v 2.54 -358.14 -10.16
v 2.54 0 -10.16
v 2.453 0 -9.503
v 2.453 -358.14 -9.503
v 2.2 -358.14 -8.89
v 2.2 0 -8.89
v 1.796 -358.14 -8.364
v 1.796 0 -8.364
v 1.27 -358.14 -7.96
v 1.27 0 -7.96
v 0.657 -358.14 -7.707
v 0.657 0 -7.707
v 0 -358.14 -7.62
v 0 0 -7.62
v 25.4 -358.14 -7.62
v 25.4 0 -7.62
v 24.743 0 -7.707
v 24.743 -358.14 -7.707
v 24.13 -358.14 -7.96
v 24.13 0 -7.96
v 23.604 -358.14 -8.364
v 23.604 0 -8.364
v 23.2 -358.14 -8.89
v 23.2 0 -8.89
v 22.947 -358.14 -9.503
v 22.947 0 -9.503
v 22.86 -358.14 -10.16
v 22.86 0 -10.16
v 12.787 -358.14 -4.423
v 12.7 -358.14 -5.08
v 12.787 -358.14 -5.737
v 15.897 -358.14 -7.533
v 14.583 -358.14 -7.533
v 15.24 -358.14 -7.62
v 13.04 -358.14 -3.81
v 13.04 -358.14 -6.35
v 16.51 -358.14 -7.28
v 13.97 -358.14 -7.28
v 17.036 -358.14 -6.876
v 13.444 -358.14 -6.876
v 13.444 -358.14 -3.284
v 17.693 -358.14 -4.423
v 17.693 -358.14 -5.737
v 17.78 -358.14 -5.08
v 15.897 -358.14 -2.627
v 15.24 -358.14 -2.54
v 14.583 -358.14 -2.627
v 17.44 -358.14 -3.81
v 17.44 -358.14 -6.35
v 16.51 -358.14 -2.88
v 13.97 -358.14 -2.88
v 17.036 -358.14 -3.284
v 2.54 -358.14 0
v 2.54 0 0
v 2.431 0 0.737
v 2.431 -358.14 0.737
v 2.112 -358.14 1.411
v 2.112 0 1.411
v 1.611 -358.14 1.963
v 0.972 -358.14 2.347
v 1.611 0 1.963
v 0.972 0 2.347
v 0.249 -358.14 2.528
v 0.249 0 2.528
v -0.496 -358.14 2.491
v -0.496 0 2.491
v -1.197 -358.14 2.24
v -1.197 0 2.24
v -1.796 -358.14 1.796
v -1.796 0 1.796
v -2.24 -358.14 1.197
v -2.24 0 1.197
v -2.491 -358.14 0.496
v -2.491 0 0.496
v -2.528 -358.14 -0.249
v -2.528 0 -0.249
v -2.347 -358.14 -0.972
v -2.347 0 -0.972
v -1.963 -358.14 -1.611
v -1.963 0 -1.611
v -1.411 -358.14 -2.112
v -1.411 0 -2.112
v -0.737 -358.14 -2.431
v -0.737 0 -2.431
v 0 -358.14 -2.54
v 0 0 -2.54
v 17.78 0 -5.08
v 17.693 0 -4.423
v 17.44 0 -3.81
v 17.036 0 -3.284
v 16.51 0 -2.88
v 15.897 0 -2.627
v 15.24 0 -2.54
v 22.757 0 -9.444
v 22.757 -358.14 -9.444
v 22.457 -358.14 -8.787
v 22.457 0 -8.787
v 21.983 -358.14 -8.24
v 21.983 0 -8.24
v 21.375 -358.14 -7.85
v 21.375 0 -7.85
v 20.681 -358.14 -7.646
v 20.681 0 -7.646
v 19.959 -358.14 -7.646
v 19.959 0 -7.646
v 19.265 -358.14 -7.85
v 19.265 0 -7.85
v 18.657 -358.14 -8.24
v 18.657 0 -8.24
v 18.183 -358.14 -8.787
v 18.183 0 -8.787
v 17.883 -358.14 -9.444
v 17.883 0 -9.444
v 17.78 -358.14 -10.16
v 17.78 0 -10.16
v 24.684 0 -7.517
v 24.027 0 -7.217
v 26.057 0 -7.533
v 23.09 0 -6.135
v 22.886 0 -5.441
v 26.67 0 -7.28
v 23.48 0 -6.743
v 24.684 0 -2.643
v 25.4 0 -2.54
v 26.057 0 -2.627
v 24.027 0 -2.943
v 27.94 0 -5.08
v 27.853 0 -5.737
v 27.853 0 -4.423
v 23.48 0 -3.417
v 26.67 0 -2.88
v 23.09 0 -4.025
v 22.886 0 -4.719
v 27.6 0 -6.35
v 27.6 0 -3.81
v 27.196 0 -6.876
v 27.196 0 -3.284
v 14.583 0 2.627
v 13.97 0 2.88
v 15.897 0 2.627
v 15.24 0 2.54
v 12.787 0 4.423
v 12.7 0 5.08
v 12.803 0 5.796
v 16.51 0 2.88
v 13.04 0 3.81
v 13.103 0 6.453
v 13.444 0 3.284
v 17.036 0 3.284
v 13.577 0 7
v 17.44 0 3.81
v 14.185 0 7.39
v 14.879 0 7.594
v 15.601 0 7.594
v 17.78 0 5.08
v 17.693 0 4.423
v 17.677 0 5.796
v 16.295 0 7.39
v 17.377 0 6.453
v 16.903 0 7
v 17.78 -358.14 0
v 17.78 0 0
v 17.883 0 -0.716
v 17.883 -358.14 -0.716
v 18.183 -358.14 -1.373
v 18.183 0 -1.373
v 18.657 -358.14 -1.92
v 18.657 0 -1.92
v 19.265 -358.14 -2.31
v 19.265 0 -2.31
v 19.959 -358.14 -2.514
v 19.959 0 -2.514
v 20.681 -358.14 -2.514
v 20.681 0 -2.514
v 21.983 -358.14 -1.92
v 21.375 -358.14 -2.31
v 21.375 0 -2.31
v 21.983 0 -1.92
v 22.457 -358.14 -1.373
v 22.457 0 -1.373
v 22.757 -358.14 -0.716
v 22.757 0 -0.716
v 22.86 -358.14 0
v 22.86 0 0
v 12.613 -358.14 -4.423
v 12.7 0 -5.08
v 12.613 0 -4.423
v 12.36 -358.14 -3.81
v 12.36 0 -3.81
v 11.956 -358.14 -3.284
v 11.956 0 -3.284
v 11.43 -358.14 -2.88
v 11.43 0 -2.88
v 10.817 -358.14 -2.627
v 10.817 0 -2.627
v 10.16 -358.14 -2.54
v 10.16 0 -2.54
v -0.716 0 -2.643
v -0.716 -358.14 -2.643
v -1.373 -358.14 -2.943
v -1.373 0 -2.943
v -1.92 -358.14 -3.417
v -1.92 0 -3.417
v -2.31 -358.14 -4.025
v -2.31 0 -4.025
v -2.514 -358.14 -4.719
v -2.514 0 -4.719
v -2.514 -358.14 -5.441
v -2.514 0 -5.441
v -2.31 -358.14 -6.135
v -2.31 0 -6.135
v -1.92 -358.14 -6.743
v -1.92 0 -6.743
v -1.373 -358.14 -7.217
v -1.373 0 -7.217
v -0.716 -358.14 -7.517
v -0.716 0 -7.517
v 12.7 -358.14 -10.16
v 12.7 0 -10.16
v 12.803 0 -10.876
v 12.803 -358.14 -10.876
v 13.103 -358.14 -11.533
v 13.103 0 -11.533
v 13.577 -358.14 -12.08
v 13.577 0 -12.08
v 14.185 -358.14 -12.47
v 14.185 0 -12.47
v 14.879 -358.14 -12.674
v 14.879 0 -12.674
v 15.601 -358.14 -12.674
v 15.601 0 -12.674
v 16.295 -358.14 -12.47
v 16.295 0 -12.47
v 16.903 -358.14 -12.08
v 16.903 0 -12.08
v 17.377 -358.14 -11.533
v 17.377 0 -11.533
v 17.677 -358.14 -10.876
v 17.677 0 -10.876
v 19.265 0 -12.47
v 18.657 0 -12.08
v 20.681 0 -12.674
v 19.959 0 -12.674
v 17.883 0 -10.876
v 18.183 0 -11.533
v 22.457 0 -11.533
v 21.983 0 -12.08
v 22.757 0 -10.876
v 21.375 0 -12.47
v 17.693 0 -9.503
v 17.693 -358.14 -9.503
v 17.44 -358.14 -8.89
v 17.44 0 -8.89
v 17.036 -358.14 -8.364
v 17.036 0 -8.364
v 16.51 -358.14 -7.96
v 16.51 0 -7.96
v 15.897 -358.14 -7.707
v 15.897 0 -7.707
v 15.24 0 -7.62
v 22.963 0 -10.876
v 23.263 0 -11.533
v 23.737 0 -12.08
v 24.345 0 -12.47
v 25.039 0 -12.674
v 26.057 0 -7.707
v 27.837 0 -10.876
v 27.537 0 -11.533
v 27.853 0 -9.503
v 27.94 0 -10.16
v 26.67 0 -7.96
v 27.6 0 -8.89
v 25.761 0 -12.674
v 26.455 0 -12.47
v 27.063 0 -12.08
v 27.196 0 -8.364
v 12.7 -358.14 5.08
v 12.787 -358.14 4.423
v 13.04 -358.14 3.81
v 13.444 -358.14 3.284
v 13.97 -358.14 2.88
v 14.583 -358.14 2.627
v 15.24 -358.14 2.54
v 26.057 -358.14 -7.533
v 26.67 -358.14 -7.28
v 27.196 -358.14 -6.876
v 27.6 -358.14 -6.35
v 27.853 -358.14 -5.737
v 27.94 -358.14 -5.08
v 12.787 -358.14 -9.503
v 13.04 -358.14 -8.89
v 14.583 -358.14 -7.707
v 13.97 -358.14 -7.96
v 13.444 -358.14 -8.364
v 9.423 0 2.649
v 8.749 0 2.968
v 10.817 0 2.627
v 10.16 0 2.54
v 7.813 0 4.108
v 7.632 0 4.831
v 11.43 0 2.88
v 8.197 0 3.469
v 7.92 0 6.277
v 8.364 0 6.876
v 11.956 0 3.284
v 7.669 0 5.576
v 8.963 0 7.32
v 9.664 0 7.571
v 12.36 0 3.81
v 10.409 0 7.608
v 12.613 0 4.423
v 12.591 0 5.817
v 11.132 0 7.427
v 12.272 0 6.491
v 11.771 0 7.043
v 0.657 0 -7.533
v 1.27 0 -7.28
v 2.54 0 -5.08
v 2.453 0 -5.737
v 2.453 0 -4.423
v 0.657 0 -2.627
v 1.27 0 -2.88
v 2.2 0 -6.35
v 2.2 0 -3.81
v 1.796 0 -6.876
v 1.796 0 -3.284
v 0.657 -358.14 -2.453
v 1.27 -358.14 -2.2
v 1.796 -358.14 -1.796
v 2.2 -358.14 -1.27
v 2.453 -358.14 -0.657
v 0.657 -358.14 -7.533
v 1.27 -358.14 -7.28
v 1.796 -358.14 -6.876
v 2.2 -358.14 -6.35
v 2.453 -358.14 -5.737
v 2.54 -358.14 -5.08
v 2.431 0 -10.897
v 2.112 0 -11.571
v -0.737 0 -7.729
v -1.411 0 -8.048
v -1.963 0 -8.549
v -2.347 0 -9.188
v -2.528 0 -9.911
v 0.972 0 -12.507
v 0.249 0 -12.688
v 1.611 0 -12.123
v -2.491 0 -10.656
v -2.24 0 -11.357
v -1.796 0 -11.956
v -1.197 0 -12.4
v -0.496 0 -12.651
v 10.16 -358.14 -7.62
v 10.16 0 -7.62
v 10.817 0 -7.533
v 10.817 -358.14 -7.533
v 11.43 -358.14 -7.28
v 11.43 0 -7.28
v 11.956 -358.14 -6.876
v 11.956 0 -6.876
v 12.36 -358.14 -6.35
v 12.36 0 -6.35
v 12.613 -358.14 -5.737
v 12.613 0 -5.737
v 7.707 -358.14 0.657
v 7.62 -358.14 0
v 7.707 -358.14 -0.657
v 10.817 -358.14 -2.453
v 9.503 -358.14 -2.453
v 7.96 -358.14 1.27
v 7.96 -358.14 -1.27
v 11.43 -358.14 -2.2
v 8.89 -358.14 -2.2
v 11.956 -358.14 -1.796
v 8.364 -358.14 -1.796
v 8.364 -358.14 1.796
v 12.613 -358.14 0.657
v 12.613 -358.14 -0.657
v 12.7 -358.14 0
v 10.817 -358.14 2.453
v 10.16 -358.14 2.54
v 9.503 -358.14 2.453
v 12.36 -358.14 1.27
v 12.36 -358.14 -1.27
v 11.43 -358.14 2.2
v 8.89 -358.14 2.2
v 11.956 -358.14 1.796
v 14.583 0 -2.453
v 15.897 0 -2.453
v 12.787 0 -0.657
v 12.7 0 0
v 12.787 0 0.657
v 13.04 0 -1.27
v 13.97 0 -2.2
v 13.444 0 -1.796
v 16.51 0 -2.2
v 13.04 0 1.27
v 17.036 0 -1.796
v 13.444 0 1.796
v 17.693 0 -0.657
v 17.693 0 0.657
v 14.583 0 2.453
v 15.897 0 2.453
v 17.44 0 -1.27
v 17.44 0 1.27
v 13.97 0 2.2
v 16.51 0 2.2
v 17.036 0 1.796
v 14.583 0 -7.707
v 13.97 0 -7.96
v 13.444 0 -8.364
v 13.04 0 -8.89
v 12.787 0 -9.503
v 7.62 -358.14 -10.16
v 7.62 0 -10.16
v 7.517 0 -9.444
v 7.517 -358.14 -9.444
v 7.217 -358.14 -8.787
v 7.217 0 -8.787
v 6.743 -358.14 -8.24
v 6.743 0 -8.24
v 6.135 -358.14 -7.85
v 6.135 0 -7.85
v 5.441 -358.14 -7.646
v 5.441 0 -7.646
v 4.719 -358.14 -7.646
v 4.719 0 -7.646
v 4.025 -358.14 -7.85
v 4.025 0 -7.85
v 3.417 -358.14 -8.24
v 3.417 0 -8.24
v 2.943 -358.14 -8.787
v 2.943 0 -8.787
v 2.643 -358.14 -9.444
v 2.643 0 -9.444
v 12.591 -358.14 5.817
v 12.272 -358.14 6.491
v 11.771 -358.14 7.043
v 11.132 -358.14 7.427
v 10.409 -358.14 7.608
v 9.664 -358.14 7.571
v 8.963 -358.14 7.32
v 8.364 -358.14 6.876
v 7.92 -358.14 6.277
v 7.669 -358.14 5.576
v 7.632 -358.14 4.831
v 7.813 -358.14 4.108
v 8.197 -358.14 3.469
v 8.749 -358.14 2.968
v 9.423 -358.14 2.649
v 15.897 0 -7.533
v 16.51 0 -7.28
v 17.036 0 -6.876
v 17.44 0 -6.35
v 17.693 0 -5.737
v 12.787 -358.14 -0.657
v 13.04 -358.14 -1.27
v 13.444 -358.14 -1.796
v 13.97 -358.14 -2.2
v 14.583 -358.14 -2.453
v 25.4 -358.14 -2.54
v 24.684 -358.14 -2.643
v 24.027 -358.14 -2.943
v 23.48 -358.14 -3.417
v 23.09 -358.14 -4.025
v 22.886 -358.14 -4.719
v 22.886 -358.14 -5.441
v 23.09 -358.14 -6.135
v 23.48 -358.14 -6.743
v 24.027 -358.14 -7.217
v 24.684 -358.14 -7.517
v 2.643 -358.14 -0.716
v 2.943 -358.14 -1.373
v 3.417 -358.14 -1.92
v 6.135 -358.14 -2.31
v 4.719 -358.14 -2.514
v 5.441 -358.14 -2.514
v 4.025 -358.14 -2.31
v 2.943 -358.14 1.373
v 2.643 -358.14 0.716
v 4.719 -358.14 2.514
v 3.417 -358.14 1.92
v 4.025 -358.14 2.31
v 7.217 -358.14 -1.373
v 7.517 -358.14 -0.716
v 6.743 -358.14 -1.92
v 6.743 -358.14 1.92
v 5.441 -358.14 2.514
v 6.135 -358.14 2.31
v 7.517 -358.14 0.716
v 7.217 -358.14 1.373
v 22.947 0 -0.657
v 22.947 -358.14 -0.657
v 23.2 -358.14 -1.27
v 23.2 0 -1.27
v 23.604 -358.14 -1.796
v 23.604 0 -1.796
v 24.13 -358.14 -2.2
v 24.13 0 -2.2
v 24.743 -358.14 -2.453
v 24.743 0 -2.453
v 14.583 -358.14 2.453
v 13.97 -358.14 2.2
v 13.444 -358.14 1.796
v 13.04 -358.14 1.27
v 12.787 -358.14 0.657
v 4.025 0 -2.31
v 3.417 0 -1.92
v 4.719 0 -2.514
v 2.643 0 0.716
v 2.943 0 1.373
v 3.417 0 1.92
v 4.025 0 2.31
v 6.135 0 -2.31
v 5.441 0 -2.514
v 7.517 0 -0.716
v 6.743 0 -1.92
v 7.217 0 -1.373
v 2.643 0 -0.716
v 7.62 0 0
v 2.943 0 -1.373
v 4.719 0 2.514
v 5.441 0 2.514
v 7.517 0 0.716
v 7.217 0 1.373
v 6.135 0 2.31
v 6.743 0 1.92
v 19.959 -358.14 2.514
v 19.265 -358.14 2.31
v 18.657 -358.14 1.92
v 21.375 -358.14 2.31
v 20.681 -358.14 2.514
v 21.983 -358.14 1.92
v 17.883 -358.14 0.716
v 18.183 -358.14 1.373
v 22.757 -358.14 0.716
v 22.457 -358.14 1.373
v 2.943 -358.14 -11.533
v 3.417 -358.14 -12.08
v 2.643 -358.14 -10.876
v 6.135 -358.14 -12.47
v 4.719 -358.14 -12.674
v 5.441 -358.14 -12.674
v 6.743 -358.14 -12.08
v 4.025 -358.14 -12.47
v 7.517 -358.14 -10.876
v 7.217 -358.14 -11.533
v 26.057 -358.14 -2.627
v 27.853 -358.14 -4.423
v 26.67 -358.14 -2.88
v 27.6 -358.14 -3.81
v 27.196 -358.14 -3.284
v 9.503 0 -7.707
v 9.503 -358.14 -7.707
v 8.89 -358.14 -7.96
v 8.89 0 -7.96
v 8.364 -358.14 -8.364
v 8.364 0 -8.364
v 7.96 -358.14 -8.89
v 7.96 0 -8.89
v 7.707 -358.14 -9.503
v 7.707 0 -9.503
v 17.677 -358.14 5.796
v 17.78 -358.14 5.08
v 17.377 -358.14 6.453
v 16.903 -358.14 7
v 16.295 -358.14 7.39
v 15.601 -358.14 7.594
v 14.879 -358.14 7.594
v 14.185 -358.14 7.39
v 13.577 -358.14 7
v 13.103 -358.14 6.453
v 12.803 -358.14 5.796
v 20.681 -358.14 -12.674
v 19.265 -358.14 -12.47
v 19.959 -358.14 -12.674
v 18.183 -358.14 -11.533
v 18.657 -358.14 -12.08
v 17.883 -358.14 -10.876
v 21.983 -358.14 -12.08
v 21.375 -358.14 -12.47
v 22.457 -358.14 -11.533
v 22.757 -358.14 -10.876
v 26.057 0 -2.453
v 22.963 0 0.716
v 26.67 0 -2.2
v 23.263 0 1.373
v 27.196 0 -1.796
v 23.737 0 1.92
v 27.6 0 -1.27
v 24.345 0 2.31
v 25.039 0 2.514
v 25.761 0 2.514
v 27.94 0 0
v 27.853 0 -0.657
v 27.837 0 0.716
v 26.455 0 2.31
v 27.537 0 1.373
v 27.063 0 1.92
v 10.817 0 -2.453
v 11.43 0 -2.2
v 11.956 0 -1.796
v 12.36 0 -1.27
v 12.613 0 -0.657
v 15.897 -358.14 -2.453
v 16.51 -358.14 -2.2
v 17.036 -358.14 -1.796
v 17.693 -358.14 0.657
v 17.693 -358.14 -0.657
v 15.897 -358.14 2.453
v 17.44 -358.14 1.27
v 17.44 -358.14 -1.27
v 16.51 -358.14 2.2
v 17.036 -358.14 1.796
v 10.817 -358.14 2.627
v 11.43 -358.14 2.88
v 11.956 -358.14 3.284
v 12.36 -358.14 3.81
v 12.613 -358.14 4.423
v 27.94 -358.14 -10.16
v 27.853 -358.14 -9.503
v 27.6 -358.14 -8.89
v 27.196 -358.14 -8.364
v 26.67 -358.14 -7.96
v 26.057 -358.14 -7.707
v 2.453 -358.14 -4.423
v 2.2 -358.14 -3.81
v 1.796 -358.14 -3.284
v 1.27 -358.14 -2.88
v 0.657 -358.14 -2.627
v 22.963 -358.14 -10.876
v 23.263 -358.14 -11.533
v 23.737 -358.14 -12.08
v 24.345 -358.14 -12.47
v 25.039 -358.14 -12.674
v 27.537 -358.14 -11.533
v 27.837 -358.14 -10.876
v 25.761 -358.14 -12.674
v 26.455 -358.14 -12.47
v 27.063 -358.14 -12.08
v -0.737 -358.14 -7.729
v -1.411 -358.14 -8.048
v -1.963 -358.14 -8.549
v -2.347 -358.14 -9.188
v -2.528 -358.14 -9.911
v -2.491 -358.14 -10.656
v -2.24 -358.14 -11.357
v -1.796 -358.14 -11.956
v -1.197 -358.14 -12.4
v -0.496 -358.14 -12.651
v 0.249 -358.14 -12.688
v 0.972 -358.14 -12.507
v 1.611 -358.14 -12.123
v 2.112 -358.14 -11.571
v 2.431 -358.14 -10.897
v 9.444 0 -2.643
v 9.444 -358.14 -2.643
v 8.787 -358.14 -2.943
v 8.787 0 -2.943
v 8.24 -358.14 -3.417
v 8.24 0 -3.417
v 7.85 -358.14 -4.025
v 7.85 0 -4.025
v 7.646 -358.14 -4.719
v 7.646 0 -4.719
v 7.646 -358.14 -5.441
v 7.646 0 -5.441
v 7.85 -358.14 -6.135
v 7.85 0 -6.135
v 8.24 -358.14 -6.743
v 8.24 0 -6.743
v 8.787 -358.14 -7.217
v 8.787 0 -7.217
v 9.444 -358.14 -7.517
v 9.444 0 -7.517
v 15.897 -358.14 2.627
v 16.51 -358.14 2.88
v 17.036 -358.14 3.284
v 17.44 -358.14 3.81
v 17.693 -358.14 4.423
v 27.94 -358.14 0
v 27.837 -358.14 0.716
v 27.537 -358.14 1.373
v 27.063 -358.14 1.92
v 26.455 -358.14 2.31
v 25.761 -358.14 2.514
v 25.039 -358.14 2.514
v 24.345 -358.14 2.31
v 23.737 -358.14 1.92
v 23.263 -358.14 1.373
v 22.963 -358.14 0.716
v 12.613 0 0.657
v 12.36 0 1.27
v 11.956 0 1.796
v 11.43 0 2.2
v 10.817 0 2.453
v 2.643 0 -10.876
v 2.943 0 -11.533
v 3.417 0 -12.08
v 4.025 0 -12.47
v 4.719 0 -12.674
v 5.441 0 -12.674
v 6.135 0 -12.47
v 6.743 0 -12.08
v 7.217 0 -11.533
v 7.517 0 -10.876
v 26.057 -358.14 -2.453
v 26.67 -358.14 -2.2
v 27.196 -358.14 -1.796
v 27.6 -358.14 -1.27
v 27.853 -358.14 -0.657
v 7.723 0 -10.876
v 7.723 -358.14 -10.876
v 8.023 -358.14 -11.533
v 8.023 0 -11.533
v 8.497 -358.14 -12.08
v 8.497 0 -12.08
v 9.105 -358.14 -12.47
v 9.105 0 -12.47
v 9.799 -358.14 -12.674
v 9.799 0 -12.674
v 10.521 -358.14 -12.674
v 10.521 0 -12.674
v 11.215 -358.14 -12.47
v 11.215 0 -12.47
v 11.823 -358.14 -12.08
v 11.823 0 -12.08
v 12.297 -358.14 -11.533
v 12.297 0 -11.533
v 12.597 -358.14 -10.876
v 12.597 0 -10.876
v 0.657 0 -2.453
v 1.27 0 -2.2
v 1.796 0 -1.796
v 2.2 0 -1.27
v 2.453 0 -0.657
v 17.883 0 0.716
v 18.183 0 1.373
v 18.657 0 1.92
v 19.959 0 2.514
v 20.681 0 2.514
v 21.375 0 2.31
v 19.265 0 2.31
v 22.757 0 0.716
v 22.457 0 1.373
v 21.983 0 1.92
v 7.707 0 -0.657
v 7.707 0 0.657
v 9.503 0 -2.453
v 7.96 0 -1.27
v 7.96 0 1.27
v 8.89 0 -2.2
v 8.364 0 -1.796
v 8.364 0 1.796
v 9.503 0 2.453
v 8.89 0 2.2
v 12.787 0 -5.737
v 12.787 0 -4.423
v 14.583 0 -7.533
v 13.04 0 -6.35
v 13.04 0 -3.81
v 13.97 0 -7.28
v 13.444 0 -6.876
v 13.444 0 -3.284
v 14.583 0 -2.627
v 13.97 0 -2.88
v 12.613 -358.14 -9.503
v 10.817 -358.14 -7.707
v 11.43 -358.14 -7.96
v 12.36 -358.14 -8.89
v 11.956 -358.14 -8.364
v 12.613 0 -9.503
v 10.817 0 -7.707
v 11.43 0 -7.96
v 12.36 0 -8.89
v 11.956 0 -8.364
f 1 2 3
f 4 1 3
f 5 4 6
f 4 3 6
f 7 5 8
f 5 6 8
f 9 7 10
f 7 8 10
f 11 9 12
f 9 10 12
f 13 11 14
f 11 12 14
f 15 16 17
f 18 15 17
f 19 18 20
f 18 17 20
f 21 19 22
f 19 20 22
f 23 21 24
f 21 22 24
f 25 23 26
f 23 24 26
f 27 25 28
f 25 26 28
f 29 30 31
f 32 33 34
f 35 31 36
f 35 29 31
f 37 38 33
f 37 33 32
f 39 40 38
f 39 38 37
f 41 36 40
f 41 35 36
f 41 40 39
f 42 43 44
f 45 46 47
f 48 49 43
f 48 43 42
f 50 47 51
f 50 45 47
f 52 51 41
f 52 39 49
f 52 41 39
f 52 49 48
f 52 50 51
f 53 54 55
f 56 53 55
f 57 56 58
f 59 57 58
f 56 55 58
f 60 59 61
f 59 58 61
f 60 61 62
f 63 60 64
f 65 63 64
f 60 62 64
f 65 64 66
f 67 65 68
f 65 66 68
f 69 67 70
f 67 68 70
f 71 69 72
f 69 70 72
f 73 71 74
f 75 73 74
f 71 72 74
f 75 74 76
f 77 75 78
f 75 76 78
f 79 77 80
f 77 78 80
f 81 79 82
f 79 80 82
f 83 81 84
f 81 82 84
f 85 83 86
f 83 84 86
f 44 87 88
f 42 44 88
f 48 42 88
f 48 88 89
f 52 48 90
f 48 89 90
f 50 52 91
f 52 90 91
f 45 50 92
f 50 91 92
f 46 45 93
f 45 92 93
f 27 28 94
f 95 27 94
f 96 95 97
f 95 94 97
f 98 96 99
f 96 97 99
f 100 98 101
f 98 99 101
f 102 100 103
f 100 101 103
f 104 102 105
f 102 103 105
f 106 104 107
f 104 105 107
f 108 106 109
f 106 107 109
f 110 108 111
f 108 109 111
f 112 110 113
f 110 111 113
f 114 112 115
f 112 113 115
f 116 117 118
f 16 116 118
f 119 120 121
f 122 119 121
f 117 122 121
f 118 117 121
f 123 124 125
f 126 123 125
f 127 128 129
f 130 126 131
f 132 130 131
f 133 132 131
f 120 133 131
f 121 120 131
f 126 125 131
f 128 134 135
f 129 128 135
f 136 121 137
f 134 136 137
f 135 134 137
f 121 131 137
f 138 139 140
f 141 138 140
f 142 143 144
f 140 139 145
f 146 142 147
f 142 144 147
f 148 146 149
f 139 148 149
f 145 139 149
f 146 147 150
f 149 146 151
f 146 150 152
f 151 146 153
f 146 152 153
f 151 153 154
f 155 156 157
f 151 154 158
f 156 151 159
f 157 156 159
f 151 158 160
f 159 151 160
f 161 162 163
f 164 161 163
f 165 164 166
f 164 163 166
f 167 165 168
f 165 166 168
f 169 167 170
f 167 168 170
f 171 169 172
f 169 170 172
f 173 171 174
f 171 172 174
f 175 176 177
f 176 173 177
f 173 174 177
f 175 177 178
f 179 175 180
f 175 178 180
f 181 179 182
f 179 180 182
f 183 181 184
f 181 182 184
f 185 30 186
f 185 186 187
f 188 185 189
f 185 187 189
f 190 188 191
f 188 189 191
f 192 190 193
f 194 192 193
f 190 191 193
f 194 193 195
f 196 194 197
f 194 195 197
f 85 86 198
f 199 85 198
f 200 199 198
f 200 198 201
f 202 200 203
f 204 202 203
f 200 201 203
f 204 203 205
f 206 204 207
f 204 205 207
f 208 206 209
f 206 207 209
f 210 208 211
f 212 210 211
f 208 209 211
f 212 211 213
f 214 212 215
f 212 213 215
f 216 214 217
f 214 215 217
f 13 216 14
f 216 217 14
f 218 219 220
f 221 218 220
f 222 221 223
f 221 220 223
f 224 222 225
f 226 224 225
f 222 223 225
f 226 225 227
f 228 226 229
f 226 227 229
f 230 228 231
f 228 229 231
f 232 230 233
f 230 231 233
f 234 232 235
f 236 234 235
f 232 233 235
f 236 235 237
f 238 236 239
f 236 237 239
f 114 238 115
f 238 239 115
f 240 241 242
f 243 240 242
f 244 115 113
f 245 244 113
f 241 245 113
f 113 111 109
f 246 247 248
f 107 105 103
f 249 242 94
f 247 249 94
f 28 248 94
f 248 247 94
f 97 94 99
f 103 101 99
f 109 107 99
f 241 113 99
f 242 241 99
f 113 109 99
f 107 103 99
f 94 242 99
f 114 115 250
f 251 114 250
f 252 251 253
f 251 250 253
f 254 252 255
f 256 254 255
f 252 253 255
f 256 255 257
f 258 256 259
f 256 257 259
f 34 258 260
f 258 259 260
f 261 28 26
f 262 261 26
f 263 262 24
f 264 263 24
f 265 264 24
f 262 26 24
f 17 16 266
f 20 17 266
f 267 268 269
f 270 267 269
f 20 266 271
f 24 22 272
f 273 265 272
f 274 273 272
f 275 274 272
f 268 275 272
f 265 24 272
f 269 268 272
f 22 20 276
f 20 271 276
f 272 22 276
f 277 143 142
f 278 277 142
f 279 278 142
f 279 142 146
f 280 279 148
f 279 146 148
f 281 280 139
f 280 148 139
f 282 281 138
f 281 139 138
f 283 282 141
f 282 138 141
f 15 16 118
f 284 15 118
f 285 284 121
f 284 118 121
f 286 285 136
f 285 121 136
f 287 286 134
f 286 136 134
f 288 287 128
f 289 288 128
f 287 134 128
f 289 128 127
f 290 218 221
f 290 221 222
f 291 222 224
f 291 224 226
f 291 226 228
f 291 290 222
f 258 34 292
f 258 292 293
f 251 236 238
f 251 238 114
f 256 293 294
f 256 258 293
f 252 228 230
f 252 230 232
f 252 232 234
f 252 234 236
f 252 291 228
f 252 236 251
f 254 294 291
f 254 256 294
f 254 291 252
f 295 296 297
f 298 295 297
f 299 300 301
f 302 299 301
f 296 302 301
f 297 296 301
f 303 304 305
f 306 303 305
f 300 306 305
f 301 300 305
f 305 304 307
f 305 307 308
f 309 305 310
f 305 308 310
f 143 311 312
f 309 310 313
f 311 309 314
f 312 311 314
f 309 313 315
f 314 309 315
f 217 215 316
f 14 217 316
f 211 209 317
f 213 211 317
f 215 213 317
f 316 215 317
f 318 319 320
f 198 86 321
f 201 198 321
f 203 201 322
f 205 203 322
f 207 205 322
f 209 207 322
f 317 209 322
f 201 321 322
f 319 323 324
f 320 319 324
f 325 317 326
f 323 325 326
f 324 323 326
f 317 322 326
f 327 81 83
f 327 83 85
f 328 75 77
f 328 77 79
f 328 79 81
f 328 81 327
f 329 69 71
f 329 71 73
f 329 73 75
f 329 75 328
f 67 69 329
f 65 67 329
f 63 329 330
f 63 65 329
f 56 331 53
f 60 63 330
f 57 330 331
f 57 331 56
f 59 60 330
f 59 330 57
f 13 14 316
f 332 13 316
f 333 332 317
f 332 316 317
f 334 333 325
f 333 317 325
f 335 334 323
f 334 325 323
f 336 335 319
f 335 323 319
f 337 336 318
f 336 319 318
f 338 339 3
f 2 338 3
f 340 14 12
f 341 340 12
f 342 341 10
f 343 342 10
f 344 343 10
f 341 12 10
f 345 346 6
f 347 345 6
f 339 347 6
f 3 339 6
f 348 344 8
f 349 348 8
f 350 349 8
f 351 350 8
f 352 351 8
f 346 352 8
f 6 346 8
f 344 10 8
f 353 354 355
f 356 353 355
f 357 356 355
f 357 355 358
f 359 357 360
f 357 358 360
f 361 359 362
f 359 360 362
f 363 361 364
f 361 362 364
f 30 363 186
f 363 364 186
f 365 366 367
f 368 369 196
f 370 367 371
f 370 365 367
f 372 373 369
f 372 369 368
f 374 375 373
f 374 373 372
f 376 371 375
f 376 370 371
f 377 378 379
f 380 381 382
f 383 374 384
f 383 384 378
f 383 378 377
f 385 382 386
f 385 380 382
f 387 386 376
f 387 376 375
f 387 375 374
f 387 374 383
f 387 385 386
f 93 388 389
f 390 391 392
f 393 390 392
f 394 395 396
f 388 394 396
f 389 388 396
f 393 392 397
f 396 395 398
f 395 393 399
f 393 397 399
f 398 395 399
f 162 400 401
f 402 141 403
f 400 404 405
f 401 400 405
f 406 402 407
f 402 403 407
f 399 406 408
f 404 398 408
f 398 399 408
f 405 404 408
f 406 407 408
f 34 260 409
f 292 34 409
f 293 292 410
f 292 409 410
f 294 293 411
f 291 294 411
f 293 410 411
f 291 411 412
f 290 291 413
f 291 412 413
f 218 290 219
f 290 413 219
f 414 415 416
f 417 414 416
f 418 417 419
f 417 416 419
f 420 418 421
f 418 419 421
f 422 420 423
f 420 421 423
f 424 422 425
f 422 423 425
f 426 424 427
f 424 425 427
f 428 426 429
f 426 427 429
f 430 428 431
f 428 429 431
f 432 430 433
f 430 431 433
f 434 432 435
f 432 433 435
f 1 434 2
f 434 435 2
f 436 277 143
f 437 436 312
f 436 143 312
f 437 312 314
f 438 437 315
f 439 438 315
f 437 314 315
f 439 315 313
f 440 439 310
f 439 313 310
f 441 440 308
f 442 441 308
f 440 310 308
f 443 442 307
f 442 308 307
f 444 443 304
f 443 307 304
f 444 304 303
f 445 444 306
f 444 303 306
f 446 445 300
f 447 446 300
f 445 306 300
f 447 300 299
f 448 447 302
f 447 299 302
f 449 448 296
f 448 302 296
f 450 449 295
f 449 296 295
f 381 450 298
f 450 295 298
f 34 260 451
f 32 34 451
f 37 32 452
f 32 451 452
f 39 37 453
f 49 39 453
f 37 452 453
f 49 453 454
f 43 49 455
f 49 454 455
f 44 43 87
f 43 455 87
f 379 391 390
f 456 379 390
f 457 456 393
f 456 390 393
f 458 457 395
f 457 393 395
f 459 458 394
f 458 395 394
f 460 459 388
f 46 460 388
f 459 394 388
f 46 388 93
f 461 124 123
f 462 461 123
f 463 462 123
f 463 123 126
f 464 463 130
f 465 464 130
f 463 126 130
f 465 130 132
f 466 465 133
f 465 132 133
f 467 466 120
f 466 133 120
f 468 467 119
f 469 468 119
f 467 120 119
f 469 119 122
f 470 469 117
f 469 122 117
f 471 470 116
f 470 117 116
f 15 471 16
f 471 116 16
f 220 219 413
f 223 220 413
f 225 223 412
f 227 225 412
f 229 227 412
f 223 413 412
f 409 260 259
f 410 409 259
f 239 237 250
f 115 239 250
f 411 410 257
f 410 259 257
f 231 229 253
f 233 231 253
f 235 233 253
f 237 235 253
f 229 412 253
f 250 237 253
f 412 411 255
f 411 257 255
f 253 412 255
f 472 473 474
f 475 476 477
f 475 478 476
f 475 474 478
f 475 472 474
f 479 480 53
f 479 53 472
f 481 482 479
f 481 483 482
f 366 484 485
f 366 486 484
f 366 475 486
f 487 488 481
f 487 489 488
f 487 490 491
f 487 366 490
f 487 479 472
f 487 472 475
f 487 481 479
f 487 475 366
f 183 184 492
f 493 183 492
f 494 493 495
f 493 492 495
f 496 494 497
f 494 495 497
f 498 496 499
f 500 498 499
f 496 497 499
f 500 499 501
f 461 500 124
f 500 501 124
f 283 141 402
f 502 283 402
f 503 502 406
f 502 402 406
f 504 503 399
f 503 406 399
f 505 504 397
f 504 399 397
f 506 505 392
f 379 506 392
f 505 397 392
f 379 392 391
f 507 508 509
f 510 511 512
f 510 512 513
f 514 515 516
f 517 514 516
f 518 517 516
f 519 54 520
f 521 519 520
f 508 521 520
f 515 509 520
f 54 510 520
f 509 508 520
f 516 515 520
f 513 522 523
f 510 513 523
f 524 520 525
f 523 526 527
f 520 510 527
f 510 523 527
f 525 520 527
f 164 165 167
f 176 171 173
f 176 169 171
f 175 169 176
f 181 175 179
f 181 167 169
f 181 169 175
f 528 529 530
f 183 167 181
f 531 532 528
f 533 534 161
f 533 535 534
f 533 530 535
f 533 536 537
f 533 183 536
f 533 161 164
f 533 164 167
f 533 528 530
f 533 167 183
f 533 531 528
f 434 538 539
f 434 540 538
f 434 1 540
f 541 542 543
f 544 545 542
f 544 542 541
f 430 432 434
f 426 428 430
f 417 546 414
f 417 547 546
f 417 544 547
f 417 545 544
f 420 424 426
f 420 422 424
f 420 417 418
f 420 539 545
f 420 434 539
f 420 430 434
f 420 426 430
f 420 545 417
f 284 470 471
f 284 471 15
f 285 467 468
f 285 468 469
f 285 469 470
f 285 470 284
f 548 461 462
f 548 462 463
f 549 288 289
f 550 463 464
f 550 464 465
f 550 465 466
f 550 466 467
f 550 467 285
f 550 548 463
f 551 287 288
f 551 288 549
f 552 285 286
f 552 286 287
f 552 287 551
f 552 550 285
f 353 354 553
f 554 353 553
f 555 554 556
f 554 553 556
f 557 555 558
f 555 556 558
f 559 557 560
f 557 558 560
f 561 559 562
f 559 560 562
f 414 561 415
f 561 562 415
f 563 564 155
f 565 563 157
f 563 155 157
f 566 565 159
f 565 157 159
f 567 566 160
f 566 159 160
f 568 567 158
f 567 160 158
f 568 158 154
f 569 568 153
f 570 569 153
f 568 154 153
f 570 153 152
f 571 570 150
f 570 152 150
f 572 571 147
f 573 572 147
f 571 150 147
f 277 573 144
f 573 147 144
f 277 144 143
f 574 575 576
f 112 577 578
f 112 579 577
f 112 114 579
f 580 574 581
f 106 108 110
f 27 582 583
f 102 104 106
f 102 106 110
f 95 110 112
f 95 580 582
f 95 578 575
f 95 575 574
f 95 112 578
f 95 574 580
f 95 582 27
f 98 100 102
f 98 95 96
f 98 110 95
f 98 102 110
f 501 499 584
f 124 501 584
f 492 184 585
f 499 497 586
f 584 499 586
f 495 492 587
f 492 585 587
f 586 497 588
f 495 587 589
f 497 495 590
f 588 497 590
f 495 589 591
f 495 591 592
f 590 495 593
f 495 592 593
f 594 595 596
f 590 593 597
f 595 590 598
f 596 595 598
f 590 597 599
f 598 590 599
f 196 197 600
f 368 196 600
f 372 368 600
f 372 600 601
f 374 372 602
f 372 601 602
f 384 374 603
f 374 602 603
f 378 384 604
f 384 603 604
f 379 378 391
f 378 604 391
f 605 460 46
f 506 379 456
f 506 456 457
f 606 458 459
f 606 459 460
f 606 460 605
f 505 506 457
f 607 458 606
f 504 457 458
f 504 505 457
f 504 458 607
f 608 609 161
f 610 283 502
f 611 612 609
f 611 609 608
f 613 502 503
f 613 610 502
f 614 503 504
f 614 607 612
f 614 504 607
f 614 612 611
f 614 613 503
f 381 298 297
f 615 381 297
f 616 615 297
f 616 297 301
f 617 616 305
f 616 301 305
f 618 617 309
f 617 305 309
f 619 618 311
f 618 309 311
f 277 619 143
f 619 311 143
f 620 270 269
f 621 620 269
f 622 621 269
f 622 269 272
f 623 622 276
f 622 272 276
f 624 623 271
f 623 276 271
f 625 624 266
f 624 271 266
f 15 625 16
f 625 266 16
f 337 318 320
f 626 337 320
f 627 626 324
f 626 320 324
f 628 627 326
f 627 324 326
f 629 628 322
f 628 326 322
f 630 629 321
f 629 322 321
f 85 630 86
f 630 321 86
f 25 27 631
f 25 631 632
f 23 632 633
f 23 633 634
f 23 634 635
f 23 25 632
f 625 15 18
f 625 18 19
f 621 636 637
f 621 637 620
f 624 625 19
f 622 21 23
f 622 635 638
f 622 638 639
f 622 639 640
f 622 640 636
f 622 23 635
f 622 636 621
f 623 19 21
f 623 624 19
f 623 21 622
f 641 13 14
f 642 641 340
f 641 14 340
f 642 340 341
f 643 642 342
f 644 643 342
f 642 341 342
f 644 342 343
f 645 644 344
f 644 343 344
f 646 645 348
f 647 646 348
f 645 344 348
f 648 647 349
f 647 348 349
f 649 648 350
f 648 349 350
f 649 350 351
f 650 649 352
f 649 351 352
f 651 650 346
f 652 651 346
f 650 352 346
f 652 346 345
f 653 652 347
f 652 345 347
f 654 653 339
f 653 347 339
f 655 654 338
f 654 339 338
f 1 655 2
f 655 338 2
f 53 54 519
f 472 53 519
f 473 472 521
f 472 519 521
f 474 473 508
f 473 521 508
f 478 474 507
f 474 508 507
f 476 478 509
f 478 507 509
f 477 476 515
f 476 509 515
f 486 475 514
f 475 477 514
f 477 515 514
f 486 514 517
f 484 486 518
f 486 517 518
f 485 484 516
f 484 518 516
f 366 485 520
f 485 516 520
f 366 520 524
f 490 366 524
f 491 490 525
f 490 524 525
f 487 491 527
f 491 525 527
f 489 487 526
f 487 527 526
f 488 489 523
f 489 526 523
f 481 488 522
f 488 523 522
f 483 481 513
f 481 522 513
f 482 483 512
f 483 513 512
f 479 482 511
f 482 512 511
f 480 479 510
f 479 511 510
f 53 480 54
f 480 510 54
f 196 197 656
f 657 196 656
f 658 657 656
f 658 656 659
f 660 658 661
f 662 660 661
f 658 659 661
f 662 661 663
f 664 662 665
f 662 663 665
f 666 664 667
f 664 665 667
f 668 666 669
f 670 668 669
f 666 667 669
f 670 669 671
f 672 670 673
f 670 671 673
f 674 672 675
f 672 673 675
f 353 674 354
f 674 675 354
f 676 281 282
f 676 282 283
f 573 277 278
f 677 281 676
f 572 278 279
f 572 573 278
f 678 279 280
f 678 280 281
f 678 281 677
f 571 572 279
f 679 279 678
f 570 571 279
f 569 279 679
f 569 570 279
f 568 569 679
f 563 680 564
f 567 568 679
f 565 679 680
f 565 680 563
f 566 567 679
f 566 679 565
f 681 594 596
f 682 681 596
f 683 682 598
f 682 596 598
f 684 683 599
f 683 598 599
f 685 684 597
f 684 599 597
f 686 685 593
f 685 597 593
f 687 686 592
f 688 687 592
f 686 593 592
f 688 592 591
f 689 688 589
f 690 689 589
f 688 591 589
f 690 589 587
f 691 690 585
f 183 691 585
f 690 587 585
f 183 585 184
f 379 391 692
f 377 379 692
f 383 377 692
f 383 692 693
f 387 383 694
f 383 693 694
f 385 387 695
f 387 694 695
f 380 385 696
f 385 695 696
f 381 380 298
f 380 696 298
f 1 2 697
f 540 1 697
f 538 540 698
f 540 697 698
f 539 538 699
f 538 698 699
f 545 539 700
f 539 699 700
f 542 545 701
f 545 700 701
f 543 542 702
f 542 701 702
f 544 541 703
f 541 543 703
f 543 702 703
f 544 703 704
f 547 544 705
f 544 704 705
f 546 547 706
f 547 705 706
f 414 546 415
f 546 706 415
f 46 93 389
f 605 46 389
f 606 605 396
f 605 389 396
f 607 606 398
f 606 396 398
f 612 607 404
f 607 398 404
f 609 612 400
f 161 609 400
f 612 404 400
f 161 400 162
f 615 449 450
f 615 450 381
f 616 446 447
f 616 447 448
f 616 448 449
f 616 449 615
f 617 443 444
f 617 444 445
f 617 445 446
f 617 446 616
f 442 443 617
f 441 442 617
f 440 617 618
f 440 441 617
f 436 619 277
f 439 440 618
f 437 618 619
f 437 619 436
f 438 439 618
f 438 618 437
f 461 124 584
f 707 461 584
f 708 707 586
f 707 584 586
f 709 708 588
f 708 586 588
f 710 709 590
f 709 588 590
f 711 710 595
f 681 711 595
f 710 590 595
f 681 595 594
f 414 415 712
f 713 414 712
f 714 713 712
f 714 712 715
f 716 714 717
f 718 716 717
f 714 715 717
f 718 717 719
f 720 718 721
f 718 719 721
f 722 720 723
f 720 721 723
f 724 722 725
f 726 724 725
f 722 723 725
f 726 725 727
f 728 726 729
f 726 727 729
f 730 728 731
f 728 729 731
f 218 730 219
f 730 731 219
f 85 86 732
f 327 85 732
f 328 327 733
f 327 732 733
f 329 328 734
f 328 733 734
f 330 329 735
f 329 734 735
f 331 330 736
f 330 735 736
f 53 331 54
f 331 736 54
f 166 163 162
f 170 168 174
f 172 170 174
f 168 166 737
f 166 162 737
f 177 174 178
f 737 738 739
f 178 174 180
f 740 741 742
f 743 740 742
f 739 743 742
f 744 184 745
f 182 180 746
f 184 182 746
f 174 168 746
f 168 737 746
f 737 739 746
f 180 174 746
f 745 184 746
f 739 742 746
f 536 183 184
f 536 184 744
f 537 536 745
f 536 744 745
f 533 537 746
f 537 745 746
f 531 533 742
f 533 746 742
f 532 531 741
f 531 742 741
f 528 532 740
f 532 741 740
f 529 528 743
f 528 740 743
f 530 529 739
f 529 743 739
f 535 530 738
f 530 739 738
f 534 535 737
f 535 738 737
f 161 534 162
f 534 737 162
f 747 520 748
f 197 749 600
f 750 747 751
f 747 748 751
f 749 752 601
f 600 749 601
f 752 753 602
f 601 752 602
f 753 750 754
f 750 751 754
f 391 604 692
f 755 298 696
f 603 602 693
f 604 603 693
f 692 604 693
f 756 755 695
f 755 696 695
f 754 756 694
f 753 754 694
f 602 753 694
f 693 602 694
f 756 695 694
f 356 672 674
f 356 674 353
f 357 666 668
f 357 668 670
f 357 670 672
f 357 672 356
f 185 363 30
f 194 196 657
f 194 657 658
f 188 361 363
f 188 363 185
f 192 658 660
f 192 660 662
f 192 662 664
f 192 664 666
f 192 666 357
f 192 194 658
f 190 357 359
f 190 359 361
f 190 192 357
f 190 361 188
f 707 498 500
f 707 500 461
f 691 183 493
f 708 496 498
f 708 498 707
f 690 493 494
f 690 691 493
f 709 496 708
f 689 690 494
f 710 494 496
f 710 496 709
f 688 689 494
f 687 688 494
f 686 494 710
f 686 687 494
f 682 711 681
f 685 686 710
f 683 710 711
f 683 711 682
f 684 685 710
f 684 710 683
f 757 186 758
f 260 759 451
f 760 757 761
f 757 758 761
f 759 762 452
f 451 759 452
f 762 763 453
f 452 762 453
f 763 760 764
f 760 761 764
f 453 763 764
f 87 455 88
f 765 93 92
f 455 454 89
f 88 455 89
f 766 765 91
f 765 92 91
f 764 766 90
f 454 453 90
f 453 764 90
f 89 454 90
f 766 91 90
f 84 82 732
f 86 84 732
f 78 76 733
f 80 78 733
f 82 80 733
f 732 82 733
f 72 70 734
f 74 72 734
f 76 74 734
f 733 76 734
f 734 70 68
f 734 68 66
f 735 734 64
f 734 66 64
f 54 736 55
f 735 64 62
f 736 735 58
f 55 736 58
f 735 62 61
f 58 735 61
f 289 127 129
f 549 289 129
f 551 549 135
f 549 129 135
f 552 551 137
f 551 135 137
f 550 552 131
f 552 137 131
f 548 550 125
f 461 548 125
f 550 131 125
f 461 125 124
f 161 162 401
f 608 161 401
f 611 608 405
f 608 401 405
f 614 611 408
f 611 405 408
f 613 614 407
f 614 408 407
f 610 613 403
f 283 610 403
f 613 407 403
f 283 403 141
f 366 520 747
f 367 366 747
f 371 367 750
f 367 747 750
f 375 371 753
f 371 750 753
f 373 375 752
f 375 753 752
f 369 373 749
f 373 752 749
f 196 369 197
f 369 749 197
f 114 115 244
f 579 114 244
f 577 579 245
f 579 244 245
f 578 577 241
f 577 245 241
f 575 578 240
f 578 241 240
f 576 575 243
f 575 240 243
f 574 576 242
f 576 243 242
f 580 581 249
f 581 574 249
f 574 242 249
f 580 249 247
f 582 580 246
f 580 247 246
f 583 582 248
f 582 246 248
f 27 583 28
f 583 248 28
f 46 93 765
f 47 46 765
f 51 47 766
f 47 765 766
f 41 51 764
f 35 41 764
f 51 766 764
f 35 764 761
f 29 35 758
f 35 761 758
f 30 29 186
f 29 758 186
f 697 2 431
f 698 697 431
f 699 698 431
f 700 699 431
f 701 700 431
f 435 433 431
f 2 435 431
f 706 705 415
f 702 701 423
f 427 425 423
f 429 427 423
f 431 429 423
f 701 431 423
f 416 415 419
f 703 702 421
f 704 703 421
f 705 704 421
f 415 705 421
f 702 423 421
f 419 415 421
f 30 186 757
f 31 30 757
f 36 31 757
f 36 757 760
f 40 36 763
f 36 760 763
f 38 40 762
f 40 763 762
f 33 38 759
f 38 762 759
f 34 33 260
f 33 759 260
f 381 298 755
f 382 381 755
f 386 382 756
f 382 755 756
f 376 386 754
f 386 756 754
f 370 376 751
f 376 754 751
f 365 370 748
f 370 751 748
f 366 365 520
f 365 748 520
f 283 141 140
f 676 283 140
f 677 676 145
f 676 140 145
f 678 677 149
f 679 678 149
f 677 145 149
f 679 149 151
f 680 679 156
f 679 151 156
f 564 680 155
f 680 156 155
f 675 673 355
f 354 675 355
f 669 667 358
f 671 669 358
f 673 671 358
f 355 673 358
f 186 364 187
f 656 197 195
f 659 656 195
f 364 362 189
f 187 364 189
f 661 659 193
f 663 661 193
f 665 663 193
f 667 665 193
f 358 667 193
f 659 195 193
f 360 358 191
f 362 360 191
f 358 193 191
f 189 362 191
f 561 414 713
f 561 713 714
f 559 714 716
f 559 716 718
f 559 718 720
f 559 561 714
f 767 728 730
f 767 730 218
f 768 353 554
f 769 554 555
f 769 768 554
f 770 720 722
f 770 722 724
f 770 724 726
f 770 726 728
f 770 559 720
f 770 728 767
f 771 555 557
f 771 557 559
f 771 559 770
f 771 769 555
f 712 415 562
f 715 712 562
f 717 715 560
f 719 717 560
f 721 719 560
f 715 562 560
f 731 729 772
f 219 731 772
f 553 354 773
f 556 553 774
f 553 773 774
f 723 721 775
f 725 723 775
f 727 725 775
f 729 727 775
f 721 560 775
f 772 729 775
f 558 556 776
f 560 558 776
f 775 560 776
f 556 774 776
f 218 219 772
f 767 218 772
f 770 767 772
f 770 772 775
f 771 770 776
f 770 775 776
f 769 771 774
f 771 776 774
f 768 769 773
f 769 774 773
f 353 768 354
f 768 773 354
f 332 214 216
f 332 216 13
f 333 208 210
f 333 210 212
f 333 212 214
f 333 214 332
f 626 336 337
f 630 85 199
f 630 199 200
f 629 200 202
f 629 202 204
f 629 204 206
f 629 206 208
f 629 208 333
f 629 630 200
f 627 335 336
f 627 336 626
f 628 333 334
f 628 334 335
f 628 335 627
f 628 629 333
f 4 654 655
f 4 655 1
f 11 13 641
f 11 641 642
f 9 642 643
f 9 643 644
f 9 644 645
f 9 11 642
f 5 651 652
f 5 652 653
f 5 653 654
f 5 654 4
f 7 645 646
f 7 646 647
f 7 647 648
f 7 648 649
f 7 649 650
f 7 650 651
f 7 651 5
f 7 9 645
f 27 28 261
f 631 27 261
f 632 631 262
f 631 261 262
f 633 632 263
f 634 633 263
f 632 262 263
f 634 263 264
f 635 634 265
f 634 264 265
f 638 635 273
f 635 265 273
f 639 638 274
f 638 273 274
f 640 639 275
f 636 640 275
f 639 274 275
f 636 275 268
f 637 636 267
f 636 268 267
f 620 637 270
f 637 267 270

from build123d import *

# Parameters (mm, degrees)
F1_DEPTH = 358.14


with BuildPart() as f1:
    # F0 (on Front) → F1 (new body)
    with BuildSketch(Plane.XZ):
        with BuildLine():
            ThreePointArc((7.62, 0), (5.08, 2.54), (2.54, 0))
            ThreePointArc((2.54, 0), (5.08, -2.54), (7.62, 0))
        make_face()
        with BuildLine():
            ThreePointArc((0, -2.54), (1.796051, -1.796051), (2.54, 0))
            ThreePointArc((2.54, 0), (-1.796051, 1.796051), (0, -2.54))
        make_face()
        with BuildLine():
            ThreePointArc((2.54, -5.08), (1.796051, -3.283949), (0, -2.54))
            ThreePointArc((0, -2.54), (-2.54, -5.08), (0, -7.62))
            ThreePointArc((0, -7.62), (1.796051, -6.876051), (2.54, -5.08))
        make_face()
        with BuildLine():
            ThreePointArc((2.54, -10.16), (1.796051, -8.363949), (0, -7.62))
            ThreePointArc((0, -7.62), (-1.796051, -11.956051), (2.54, -10.16))
        make_face()
        with BuildLine():
            ThreePointArc((7.62, -10.16), (5.08, -7.62), (2.54, -10.16))
            ThreePointArc((2.54, -10.16), (5.08, -12.7), (7.62, -10.16))
        make_face()
        with BuildLine():
            ThreePointArc((12.7, -10.16), (11.956051, -8.363949), (10.16, -7.62))
            ThreePointArc((10.16, -7.62), (8.363949, -8.363949), (7.62, -10.16))
            ThreePointArc((7.62, -10.16), (10.16, -12.7), (12.7, -10.16))
        make_face()
        with BuildLine():
            ThreePointArc((12.7, -5.08), (11.956051, -3.283949), (10.16, -2.54))
            ThreePointArc((10.16, -2.54), (7.62, -5.08), (10.16, -7.62))
            ThreePointArc((10.16, -7.62), (11.956051, -6.876051), (12.7, -5.08))
        make_face()
        with BuildLine():
            ThreePointArc((10.16, 2.54), (8.363949, 1.796051), (7.62, 0))
            ThreePointArc((7.62, 0), (8.363949, -1.796051), (10.16, -2.54))
            ThreePointArc((10.16, -2.54), (11.956051, -1.796051), (12.7, 0))
            ThreePointArc((12.7, 0), (11.956051, 1.796051), (10.16, 2.54))
        make_face()
        with BuildLine():
            ThreePointArc((12.7, 5.08), (8.363949, 6.876051), (10.16, 2.54))
            ThreePointArc((10.16, 2.54), (11.956051, 3.283949), (12.7, 5.08))
        make_face()
        with BuildLine():
            ThreePointArc((17.78, 5.08), (15.24, 7.62), (12.7, 5.08))
            ThreePointArc((12.7, 5.08), (13.443949, 3.283949), (15.24, 2.54))
            ThreePointArc((15.24, 2.54), (17.036051, 3.283949), (17.78, 5.08))
        make_face()
        with BuildLine():
            ThreePointArc((15.24, 2.54), (13.443949, 1.796051), (12.7, 0))
            ThreePointArc((12.7, 0), (13.443949, -1.796051), (15.24, -2.54))
            ThreePointArc((15.24, -2.54), (17.036051, -1.796051), (17.78, 0))
            ThreePointArc((17.78, 0), (17.036051, 1.796051), (15.24, 2.54))
        make_face()
        with BuildLine():
            ThreePointArc((15.24, -2.54), (13.443949, -3.283949), (12.7, -5.08))
            ThreePointArc((12.7, -5.08), (13.443949, -6.876051), (15.24, -7.62))
            ThreePointArc((15.24, -7.62), (17.036051, -6.876051), (17.78, -5.08))
            ThreePointArc((17.78, -5.08), (17.036051, -3.283949), (15.24, -2.54))
        make_face()
        with BuildLine():
            ThreePointArc((17.78, -10.16), (17.036051, -8.363949), (15.24, -7.62))
            ThreePointArc((15.24, -7.62), (13.443949, -8.363949), (12.7, -10.16))
            ThreePointArc((12.7, -10.16), (15.24, -12.7), (17.78, -10.16))
        make_face()
        with BuildLine():
            ThreePointArc((22.86, -10.16), (20.32, -7.62), (17.78, -10.16))
            ThreePointArc((17.78, -10.16), (20.32, -12.7), (22.86, -10.16))
        make_face()
        with BuildLine():
            ThreePointArc((25.4, -7.62), (23.603949, -8.363949), (22.86, -10.16))
            ThreePointArc((22.86, -10.16), (25.4, -12.7), (27.94, -10.16))
            ThreePointArc((27.94, -10.16), (27.196051, -8.363949), (25.4, -7.62))
        make_face()
        with BuildLine():
            ThreePointArc((27.94, -5.08), (27.196051, -3.283949), (25.4, -2.54))
            ThreePointArc((25.4, -2.54), (22.86, -5.08), (25.4, -7.62))
            ThreePointArc((25.4, -7.62), (27.196051, -6.876051), (27.94, -5.08))
        make_face()
        with BuildLine():
            ThreePointArc((27.94, 0), (25.4, 2.54), (22.86, 0))
            ThreePointArc((22.86, 0), (23.603949, -1.796051), (25.4, -2.54))
            ThreePointArc((25.4, -2.54), (27.196051, -1.796051), (27.94, 0))
        make_face()
        with BuildLine():
            ThreePointArc((22.86, 0), (20.32, 2.54), (17.78, 0))
            ThreePointArc((17.78, 0), (20.32, -2.54), (22.86, 0))
        make_face()
    extrude(amount=F1_DEPTH)


solid = f1.part
